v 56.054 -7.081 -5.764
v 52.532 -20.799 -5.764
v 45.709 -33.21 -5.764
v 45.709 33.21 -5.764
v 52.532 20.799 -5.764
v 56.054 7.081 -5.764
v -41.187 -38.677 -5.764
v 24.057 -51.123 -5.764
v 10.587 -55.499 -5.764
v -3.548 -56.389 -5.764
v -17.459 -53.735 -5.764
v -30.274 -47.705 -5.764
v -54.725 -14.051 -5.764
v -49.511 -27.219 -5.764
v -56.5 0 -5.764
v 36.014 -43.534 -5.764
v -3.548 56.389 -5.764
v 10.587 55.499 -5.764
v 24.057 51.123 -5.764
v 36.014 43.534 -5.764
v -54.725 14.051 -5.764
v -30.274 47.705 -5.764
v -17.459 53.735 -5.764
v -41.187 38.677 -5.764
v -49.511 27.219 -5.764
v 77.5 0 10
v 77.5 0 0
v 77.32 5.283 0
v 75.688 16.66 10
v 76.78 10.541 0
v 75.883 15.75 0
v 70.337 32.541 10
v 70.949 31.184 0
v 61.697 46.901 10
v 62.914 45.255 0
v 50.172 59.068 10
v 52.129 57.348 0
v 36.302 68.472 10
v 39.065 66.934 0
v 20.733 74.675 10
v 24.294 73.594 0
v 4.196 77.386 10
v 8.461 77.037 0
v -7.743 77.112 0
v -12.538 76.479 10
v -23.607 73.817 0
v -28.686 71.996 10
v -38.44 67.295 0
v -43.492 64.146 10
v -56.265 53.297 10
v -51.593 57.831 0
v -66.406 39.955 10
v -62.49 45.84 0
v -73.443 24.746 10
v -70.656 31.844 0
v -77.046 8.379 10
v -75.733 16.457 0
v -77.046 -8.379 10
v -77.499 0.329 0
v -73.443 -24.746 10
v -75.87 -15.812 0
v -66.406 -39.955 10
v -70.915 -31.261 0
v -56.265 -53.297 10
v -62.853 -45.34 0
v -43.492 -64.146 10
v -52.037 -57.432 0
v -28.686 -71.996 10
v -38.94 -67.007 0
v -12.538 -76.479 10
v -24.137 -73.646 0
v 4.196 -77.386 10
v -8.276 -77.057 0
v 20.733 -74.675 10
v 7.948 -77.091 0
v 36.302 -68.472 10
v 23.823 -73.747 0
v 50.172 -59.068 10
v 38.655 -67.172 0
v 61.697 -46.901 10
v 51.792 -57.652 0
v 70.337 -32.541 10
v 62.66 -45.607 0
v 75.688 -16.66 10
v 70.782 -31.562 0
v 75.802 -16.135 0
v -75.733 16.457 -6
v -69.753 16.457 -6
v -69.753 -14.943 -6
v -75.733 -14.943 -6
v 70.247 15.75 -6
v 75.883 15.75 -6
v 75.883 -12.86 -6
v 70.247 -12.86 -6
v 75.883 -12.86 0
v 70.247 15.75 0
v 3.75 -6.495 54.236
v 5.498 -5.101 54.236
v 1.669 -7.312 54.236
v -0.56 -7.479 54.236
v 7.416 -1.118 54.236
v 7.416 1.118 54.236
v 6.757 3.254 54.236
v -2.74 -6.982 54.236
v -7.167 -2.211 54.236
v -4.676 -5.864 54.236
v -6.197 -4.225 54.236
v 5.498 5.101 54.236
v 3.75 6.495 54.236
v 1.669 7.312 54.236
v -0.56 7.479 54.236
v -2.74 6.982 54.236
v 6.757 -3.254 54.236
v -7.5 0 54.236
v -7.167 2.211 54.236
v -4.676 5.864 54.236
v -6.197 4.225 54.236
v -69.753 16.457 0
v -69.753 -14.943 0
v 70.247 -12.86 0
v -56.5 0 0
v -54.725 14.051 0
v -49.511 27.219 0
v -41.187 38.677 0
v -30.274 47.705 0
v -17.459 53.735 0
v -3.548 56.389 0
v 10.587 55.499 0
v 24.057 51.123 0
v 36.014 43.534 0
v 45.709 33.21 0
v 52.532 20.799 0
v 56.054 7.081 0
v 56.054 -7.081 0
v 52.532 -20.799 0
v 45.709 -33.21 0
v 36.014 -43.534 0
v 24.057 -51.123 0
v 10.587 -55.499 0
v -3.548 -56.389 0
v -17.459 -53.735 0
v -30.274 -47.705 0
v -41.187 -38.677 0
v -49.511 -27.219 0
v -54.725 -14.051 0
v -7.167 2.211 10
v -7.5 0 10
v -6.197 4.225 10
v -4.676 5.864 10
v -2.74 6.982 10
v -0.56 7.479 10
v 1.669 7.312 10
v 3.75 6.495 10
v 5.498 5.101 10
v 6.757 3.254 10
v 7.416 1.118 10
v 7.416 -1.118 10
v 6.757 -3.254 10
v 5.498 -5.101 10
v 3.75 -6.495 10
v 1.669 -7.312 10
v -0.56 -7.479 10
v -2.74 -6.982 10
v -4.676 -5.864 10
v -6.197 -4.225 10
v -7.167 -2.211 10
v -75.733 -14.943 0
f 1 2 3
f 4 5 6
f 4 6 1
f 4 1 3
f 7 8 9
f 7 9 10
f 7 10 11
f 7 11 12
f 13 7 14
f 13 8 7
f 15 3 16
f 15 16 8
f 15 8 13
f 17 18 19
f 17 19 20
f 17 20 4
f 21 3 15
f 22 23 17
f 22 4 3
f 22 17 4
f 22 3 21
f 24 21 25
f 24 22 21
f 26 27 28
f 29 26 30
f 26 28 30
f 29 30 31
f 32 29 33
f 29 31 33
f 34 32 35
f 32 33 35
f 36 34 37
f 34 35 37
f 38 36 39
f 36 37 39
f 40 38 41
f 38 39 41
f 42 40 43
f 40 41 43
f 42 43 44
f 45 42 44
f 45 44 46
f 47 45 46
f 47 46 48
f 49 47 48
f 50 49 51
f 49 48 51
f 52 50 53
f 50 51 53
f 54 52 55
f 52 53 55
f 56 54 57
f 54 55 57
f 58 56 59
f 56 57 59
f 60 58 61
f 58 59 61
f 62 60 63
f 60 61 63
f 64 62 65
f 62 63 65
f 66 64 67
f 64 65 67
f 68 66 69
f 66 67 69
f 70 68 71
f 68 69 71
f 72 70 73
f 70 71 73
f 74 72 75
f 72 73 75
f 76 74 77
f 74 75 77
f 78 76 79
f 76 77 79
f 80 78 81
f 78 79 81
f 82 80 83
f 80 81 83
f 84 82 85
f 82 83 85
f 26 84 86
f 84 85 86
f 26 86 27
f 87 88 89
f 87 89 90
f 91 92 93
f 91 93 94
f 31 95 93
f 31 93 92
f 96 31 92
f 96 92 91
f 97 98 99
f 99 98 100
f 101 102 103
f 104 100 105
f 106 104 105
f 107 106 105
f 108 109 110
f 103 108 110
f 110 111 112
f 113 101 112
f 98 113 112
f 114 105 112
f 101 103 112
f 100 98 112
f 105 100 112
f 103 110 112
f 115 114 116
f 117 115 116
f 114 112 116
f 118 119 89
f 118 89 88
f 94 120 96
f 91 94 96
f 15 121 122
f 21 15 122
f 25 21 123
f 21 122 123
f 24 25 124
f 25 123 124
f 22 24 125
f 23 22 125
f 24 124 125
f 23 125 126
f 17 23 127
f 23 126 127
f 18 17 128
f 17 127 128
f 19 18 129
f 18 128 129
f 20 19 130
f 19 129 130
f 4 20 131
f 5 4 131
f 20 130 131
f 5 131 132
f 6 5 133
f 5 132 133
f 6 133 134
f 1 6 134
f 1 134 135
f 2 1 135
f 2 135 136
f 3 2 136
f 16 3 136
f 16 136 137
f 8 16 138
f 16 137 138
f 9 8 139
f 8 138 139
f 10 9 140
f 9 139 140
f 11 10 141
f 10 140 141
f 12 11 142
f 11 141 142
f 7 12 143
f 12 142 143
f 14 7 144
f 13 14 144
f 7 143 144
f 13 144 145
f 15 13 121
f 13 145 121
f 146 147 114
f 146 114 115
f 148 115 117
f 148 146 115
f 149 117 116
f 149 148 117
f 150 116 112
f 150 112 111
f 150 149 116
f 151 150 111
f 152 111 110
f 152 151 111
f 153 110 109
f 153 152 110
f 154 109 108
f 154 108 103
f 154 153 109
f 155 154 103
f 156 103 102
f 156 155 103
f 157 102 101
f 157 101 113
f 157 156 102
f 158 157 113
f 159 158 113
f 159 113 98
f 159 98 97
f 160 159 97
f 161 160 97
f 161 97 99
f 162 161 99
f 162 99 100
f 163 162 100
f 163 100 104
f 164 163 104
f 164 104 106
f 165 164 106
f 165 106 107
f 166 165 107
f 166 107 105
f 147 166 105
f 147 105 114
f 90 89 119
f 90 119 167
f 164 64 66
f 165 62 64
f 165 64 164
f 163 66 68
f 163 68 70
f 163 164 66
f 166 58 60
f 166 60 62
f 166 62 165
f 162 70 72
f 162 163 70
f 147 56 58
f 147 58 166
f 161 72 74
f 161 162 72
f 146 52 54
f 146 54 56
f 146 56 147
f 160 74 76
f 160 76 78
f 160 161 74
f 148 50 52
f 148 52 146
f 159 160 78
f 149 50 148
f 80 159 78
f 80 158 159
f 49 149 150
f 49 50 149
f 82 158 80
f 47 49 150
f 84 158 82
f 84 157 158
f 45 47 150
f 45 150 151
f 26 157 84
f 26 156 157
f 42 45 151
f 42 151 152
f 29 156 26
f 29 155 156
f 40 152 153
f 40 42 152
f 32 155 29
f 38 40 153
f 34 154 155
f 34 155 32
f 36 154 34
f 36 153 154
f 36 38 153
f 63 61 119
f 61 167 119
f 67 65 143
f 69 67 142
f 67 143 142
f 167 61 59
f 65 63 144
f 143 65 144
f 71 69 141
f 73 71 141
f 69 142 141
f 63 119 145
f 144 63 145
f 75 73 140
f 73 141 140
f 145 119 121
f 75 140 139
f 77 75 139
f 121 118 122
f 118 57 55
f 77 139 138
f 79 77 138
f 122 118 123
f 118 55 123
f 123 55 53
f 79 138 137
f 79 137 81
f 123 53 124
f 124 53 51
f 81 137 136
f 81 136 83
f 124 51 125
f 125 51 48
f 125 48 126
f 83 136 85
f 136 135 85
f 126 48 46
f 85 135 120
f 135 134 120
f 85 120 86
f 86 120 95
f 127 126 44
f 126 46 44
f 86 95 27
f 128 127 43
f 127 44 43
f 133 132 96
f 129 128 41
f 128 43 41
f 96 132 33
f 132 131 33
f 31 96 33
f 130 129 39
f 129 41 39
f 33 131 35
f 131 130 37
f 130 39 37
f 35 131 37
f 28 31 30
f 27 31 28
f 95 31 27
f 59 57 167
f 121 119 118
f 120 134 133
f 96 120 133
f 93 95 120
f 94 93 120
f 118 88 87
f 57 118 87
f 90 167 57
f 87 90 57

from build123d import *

# Parameters (mm, degrees)
SKETCH1_R           = 77.5
BOSS_EXTRUDE1_DEPTH = 10
SKETCH2_R           = 56.5
BOSS_EXTRUDE2_DEPTH = 5.764188233
SKETCH3_R           = 7.5
BOSS_EXTRUDE3_DEPTH = 60
SKETCH4_W           = 5.635994667
SKETCH4_H           = 28.610379267
SKETCH4_W_2         = 5.979262635
SKETCH4_H_2         = 31.399489247
BOSS_EXTRUDE4_DEPTH = 6


with BuildPart() as part:
    # Sketch1 → Boss-Extrude1 (new body)
    with BuildSketch(Plane.XY):
        Circle(SKETCH1_R)
    extrude(amount=BOSS_EXTRUDE1_DEPTH)

    # Sketch2 → Boss-Extrude2 (add)
    with BuildSketch(Plane(origin=(0, 0, 0), x_dir=(-1, 0, 0), z_dir=(0, 0, -1))):
        Circle(SKETCH2_R)
    extrude(amount=BOSS_EXTRUDE2_DEPTH)

    # Sketch3 → Boss-Extrude3 (add)
    with BuildSketch(Plane(origin=(0, 0, -5.764188233), x_dir=(-1, 0, 0), z_dir=(0, 0, -1))):
        Circle(SKETCH3_R)
    extrude(amount=-BOSS_EXTRUDE3_DEPTH)

    # Sketch4 → Boss-Extrude4 (add)
    with BuildSketch(Plane(origin=(0, 0, 0), x_dir=(-1, 0, 0), z_dir=(0, 0, -1))):
        with Locations((-73.064647, 1.445184616)):
            Rectangle(SKETCH4_W, SKETCH4_H)
        with Locations((72.742981652, 0.756905489)):
            Rectangle(SKETCH4_W_2, SKETCH4_H_2)
    extrude(amount=BOSS_EXTRUDE4_DEPTH)


solid = part.part
